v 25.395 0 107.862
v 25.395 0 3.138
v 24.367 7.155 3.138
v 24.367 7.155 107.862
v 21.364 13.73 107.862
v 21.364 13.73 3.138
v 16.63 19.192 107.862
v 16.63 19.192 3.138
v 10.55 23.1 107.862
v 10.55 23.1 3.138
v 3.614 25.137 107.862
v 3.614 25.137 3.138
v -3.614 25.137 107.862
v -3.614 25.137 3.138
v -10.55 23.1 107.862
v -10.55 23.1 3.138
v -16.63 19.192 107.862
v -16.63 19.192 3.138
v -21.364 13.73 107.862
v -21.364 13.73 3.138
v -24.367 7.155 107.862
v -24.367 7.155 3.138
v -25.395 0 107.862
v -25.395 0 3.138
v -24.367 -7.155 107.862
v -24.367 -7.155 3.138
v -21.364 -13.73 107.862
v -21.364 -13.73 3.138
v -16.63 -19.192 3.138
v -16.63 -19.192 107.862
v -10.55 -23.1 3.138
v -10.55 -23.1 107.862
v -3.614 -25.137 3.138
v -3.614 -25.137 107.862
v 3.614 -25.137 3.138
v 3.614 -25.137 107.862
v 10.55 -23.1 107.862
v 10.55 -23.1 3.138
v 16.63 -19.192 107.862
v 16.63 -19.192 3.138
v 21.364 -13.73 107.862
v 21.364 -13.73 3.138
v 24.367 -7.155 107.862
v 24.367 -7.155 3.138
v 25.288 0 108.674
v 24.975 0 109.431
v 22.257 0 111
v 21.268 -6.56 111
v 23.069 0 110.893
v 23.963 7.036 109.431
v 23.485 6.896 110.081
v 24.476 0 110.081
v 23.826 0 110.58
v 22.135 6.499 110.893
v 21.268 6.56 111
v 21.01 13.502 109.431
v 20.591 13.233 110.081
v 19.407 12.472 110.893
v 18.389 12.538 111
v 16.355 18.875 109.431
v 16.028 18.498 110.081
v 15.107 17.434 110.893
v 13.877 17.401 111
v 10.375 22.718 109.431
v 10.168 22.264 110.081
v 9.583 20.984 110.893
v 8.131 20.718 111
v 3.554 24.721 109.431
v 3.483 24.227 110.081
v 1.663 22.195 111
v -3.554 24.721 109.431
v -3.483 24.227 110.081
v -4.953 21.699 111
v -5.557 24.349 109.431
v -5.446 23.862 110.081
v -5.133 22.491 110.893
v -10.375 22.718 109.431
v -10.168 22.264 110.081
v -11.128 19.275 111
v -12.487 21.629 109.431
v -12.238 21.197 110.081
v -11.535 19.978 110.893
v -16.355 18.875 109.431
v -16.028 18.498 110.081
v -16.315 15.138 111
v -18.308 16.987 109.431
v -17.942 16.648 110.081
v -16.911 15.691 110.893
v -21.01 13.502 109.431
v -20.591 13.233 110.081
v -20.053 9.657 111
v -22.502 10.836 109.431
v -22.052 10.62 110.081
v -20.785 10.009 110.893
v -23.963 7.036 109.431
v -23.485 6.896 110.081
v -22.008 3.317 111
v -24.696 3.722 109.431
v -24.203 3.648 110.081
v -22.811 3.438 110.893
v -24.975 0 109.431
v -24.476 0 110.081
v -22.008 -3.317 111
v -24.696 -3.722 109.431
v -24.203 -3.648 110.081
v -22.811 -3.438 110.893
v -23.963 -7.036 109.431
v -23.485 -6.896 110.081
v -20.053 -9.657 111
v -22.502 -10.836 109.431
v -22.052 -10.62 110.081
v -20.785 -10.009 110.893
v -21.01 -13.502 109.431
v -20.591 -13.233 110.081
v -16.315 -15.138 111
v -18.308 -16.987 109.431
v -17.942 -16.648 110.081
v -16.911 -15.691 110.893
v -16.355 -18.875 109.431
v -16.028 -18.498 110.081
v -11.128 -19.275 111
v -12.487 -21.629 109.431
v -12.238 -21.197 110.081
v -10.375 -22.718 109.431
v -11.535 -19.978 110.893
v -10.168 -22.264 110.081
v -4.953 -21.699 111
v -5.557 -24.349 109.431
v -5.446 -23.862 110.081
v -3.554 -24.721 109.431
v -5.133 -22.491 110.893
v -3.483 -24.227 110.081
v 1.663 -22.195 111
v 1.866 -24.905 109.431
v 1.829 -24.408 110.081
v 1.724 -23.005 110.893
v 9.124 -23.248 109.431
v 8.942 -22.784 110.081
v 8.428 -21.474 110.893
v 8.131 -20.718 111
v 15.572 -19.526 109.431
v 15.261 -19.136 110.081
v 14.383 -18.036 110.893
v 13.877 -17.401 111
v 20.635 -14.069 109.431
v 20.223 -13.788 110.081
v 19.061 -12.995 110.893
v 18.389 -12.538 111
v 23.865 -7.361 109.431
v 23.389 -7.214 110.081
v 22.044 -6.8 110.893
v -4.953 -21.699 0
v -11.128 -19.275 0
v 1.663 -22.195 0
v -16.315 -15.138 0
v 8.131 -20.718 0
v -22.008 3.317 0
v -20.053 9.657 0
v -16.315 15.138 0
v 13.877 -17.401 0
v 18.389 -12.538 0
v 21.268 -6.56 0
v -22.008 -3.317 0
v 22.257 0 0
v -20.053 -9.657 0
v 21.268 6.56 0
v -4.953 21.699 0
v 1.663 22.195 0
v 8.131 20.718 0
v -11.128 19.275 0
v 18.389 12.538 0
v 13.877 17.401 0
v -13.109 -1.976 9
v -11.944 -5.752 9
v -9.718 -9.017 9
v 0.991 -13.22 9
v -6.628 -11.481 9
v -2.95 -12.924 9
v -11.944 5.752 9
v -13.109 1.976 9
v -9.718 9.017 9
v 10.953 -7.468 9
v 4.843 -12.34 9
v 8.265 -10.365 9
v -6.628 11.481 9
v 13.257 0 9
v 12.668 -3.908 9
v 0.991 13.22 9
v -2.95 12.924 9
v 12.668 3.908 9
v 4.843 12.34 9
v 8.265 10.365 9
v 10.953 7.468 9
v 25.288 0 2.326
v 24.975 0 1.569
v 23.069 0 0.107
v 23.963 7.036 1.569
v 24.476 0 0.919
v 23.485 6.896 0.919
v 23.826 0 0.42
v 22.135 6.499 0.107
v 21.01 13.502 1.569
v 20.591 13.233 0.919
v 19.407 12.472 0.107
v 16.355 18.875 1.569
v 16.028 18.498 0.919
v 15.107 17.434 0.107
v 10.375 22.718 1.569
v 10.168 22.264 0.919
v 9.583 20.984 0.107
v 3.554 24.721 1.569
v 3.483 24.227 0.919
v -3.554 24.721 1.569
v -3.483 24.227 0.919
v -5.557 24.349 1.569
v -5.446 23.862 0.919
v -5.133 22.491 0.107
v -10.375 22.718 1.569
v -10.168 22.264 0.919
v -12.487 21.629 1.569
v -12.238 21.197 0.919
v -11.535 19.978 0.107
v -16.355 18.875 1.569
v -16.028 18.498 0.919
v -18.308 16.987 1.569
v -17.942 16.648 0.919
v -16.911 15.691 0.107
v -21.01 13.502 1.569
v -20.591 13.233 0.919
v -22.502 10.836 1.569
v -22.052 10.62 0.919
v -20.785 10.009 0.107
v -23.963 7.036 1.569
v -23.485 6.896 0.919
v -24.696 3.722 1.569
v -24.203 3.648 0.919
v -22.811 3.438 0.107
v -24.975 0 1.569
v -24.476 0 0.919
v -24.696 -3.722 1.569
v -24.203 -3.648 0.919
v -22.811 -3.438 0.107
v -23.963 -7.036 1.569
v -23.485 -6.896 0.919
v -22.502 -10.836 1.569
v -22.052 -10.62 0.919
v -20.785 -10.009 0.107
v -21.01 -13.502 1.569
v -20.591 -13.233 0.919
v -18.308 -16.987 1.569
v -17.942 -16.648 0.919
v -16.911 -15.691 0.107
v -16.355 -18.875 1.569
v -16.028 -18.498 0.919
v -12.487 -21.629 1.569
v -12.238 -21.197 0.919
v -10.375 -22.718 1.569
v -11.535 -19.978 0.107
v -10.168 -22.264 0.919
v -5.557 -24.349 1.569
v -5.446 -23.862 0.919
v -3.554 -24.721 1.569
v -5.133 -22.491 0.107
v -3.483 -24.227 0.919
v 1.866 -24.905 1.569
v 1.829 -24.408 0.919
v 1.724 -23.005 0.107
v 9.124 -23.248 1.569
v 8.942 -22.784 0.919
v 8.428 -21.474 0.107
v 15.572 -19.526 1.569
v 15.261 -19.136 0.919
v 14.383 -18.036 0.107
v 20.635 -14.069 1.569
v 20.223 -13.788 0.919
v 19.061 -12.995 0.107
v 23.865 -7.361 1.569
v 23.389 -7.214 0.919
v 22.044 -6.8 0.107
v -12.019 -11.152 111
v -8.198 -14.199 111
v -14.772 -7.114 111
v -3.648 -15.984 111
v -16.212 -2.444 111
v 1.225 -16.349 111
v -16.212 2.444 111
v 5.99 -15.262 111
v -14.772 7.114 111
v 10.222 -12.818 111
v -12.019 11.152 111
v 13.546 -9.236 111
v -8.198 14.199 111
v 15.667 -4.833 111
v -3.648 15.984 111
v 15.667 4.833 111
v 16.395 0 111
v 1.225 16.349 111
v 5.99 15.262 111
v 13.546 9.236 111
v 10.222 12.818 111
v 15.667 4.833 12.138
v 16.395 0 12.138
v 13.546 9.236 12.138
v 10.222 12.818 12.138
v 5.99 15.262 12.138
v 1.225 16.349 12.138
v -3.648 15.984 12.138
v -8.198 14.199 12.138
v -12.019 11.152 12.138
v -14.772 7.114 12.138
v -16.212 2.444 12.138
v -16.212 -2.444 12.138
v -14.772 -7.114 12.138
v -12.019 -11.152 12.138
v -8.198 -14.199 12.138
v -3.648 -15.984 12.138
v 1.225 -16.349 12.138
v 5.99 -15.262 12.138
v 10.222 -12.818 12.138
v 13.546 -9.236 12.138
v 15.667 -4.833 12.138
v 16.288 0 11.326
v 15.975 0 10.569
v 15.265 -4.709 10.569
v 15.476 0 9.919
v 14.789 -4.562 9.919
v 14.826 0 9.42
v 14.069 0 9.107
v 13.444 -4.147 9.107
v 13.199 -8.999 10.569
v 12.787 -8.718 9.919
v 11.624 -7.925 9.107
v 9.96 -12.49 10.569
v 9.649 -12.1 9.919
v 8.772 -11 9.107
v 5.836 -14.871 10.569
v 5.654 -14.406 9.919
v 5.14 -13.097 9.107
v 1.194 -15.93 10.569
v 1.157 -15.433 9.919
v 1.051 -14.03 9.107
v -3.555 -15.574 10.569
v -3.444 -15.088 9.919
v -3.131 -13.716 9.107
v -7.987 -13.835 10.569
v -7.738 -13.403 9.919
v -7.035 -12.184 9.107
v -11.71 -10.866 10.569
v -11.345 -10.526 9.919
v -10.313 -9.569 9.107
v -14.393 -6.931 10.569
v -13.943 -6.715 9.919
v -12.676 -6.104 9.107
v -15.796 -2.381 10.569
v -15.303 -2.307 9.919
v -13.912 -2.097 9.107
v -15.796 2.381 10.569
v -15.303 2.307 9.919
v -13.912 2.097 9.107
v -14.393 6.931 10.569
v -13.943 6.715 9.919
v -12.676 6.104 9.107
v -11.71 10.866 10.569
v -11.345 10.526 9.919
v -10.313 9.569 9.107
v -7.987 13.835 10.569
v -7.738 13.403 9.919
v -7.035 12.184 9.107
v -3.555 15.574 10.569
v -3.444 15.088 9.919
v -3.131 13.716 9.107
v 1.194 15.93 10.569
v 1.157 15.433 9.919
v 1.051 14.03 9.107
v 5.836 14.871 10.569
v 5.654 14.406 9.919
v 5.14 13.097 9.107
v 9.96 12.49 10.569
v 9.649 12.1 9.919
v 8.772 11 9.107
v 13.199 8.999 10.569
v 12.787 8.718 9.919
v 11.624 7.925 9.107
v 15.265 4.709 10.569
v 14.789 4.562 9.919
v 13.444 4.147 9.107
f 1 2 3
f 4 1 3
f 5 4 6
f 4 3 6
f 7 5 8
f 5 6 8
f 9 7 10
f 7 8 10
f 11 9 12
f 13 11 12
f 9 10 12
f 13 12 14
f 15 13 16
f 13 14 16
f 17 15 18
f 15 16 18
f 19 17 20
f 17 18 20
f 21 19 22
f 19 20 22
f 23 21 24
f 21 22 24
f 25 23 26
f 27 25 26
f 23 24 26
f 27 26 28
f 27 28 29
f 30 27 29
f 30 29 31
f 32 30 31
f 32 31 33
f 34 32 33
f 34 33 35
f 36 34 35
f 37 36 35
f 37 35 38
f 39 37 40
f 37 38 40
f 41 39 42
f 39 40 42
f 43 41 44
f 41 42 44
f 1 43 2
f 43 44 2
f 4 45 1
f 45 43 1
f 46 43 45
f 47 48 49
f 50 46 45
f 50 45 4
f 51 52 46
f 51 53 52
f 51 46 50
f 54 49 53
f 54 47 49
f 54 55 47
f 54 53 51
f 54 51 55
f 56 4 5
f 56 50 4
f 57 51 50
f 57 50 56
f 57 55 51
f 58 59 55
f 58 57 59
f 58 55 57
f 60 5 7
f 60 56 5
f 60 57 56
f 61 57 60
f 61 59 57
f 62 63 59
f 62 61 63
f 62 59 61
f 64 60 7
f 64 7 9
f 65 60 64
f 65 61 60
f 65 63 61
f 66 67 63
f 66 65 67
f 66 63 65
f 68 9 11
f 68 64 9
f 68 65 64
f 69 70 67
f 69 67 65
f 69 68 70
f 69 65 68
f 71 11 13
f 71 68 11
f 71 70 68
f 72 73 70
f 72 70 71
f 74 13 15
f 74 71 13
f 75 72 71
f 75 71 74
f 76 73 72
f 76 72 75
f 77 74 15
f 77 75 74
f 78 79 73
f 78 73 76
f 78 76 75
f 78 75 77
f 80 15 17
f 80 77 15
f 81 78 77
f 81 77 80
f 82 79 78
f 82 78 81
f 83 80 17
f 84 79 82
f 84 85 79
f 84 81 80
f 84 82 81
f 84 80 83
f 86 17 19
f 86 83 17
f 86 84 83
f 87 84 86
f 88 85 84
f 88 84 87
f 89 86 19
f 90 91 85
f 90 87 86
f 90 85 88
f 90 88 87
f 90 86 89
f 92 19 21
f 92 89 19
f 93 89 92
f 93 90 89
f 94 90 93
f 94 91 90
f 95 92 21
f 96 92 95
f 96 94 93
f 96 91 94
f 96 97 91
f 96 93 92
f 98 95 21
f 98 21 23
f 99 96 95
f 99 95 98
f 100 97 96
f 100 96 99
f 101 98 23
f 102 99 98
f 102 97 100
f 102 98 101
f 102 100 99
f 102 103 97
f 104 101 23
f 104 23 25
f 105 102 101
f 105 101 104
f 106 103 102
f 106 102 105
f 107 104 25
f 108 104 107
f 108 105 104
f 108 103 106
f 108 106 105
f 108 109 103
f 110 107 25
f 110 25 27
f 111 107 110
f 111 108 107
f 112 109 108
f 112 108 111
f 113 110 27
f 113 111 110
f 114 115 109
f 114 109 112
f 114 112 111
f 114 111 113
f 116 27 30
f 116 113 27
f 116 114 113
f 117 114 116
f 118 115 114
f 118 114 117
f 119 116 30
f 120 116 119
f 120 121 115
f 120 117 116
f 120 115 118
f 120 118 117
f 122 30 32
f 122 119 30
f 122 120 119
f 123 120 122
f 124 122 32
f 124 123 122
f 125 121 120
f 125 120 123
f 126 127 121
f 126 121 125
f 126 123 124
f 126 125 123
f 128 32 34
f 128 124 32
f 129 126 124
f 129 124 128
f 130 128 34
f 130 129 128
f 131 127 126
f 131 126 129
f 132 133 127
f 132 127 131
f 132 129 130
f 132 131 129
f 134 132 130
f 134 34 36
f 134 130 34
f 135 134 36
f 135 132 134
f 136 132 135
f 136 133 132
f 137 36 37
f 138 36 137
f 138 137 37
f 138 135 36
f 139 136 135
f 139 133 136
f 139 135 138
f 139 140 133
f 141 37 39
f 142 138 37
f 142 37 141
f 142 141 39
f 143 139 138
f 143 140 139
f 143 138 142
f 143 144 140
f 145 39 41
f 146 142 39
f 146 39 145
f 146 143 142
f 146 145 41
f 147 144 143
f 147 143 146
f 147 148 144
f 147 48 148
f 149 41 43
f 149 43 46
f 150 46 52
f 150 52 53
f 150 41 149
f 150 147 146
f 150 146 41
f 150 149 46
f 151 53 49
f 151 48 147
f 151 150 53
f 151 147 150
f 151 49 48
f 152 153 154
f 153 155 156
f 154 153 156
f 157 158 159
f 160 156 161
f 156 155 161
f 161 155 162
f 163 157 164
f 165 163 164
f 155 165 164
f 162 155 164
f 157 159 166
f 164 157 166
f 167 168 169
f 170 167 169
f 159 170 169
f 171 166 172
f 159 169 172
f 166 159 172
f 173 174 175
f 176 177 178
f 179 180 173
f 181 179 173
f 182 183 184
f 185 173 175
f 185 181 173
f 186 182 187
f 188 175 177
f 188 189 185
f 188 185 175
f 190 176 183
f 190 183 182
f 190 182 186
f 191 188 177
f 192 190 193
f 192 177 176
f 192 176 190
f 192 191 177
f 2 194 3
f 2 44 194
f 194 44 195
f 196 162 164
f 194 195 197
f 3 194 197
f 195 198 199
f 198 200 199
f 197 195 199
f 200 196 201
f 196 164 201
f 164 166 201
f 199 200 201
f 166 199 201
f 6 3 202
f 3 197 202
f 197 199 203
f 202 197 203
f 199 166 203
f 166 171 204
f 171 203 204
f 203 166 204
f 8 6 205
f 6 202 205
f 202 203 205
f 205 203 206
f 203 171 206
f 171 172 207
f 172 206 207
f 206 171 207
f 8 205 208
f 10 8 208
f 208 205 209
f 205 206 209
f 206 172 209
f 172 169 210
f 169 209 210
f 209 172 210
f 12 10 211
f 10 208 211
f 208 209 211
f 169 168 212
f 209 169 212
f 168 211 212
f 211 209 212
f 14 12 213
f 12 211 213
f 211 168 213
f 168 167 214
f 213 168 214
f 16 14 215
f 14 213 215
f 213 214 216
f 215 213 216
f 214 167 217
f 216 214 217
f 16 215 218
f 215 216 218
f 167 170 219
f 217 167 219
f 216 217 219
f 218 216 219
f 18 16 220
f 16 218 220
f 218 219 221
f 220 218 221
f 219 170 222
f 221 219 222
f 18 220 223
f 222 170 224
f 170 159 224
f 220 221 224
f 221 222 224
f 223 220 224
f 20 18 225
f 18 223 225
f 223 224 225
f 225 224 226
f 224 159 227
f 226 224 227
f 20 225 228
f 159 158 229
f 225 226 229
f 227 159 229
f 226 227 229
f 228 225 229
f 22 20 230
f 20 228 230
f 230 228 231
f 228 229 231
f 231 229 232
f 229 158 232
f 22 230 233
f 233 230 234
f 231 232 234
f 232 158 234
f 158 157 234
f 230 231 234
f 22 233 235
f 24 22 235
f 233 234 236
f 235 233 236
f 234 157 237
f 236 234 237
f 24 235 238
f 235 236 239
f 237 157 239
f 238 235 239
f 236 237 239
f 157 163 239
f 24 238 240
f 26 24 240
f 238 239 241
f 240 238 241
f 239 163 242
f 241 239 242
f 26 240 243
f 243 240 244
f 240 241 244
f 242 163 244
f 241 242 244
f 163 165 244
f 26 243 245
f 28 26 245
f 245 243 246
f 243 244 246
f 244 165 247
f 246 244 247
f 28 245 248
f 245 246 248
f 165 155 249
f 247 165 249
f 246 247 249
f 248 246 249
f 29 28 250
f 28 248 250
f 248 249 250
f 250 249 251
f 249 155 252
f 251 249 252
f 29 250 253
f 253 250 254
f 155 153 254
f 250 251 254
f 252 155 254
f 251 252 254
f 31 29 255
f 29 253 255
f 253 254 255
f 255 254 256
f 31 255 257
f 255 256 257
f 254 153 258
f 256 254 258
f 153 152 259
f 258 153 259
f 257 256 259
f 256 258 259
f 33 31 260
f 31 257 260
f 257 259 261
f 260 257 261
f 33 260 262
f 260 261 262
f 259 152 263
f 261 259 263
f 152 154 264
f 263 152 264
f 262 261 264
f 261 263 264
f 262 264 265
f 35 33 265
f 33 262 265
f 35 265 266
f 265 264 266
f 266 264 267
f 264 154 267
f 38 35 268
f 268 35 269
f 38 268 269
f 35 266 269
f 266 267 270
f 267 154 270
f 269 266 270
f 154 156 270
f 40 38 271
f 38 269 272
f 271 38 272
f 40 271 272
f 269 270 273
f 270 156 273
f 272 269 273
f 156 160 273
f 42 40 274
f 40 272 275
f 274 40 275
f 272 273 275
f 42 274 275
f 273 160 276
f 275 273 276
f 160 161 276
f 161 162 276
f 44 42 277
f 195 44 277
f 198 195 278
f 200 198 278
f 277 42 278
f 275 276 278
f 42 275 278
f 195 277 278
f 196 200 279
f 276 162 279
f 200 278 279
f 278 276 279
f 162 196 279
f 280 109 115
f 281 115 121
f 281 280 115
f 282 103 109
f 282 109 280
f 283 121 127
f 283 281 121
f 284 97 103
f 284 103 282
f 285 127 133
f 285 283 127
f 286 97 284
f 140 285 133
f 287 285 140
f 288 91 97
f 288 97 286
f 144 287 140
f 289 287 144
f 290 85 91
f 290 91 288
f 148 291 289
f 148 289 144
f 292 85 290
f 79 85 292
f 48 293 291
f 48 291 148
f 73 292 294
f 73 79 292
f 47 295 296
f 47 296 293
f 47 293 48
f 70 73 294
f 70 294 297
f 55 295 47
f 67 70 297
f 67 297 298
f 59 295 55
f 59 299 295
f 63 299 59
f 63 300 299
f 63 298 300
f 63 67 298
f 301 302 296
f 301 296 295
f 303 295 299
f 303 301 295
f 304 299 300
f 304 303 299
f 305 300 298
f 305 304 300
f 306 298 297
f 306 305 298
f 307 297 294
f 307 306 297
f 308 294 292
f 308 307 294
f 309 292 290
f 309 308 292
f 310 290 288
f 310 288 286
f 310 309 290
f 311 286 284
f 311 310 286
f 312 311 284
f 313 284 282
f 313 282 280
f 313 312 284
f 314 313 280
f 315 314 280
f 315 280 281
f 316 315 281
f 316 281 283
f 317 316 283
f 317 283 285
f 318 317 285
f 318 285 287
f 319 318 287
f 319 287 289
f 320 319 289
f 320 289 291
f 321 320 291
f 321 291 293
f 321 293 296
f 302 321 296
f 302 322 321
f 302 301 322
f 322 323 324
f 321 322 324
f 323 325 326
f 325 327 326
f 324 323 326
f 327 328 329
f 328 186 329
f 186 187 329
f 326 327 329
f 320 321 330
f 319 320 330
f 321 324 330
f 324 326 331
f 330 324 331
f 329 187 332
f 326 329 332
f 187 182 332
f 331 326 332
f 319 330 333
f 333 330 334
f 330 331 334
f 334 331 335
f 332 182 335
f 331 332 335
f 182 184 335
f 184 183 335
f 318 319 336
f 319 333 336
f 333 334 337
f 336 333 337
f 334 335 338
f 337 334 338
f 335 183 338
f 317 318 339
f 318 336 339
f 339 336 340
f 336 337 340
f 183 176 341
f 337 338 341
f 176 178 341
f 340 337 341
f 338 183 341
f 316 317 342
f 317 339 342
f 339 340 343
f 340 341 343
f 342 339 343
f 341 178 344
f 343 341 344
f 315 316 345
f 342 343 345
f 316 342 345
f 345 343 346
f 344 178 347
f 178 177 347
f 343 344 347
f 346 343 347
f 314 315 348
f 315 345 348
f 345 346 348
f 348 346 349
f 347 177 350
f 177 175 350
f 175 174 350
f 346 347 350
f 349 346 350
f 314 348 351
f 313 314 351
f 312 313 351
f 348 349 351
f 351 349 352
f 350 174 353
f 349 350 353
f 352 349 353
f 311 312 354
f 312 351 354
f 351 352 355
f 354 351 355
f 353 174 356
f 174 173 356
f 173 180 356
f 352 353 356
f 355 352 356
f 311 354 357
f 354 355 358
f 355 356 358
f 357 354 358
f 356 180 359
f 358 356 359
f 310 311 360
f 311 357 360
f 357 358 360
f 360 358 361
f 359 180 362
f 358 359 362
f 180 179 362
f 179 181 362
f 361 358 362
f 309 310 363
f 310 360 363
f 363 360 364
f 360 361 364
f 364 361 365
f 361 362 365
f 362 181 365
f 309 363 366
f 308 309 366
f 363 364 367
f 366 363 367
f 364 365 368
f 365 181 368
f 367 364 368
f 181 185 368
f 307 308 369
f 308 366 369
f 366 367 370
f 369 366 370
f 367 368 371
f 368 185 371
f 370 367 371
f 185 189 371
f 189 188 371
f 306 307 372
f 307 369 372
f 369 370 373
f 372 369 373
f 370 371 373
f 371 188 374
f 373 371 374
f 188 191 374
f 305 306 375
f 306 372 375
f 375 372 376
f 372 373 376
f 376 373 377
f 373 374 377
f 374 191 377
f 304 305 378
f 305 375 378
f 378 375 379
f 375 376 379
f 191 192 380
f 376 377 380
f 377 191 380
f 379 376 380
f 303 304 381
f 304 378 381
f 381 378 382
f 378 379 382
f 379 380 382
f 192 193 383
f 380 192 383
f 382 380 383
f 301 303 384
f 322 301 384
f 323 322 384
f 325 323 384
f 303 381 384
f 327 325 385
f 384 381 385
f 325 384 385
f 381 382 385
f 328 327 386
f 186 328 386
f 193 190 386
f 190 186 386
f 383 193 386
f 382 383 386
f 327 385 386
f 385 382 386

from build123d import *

# Parameters (mm, degrees)
F0_R     = 25.3953088791
F1_DEPTH = 111
F2_T     = -9
F3_R     = 3.1384776311


with BuildPart() as f1:
    # F0 (on Top) → F1 (new body)
    with BuildSketch(Plane.XY):
        Circle(F0_R)
    extrude(amount=F1_DEPTH)

    # F2
    f2_openings = [f1.faces().sort_by_distance(p)[0] for p in [
        (0, 0, 111),
    ]]
    offset(amount=F2_T, openings=f2_openings)

    # F3
    f3_edges = [f1.edges().sort_by_distance(p)[0] for p in [
        (25.395309, 0, 55.5),
        (-25.395309, 0, 0),
        (-25.395309, 0, 111),
        (-16.395309, 0, 9),
    ]]
    fillet(f3_edges, radius=F3_R)


solid = f1.part
